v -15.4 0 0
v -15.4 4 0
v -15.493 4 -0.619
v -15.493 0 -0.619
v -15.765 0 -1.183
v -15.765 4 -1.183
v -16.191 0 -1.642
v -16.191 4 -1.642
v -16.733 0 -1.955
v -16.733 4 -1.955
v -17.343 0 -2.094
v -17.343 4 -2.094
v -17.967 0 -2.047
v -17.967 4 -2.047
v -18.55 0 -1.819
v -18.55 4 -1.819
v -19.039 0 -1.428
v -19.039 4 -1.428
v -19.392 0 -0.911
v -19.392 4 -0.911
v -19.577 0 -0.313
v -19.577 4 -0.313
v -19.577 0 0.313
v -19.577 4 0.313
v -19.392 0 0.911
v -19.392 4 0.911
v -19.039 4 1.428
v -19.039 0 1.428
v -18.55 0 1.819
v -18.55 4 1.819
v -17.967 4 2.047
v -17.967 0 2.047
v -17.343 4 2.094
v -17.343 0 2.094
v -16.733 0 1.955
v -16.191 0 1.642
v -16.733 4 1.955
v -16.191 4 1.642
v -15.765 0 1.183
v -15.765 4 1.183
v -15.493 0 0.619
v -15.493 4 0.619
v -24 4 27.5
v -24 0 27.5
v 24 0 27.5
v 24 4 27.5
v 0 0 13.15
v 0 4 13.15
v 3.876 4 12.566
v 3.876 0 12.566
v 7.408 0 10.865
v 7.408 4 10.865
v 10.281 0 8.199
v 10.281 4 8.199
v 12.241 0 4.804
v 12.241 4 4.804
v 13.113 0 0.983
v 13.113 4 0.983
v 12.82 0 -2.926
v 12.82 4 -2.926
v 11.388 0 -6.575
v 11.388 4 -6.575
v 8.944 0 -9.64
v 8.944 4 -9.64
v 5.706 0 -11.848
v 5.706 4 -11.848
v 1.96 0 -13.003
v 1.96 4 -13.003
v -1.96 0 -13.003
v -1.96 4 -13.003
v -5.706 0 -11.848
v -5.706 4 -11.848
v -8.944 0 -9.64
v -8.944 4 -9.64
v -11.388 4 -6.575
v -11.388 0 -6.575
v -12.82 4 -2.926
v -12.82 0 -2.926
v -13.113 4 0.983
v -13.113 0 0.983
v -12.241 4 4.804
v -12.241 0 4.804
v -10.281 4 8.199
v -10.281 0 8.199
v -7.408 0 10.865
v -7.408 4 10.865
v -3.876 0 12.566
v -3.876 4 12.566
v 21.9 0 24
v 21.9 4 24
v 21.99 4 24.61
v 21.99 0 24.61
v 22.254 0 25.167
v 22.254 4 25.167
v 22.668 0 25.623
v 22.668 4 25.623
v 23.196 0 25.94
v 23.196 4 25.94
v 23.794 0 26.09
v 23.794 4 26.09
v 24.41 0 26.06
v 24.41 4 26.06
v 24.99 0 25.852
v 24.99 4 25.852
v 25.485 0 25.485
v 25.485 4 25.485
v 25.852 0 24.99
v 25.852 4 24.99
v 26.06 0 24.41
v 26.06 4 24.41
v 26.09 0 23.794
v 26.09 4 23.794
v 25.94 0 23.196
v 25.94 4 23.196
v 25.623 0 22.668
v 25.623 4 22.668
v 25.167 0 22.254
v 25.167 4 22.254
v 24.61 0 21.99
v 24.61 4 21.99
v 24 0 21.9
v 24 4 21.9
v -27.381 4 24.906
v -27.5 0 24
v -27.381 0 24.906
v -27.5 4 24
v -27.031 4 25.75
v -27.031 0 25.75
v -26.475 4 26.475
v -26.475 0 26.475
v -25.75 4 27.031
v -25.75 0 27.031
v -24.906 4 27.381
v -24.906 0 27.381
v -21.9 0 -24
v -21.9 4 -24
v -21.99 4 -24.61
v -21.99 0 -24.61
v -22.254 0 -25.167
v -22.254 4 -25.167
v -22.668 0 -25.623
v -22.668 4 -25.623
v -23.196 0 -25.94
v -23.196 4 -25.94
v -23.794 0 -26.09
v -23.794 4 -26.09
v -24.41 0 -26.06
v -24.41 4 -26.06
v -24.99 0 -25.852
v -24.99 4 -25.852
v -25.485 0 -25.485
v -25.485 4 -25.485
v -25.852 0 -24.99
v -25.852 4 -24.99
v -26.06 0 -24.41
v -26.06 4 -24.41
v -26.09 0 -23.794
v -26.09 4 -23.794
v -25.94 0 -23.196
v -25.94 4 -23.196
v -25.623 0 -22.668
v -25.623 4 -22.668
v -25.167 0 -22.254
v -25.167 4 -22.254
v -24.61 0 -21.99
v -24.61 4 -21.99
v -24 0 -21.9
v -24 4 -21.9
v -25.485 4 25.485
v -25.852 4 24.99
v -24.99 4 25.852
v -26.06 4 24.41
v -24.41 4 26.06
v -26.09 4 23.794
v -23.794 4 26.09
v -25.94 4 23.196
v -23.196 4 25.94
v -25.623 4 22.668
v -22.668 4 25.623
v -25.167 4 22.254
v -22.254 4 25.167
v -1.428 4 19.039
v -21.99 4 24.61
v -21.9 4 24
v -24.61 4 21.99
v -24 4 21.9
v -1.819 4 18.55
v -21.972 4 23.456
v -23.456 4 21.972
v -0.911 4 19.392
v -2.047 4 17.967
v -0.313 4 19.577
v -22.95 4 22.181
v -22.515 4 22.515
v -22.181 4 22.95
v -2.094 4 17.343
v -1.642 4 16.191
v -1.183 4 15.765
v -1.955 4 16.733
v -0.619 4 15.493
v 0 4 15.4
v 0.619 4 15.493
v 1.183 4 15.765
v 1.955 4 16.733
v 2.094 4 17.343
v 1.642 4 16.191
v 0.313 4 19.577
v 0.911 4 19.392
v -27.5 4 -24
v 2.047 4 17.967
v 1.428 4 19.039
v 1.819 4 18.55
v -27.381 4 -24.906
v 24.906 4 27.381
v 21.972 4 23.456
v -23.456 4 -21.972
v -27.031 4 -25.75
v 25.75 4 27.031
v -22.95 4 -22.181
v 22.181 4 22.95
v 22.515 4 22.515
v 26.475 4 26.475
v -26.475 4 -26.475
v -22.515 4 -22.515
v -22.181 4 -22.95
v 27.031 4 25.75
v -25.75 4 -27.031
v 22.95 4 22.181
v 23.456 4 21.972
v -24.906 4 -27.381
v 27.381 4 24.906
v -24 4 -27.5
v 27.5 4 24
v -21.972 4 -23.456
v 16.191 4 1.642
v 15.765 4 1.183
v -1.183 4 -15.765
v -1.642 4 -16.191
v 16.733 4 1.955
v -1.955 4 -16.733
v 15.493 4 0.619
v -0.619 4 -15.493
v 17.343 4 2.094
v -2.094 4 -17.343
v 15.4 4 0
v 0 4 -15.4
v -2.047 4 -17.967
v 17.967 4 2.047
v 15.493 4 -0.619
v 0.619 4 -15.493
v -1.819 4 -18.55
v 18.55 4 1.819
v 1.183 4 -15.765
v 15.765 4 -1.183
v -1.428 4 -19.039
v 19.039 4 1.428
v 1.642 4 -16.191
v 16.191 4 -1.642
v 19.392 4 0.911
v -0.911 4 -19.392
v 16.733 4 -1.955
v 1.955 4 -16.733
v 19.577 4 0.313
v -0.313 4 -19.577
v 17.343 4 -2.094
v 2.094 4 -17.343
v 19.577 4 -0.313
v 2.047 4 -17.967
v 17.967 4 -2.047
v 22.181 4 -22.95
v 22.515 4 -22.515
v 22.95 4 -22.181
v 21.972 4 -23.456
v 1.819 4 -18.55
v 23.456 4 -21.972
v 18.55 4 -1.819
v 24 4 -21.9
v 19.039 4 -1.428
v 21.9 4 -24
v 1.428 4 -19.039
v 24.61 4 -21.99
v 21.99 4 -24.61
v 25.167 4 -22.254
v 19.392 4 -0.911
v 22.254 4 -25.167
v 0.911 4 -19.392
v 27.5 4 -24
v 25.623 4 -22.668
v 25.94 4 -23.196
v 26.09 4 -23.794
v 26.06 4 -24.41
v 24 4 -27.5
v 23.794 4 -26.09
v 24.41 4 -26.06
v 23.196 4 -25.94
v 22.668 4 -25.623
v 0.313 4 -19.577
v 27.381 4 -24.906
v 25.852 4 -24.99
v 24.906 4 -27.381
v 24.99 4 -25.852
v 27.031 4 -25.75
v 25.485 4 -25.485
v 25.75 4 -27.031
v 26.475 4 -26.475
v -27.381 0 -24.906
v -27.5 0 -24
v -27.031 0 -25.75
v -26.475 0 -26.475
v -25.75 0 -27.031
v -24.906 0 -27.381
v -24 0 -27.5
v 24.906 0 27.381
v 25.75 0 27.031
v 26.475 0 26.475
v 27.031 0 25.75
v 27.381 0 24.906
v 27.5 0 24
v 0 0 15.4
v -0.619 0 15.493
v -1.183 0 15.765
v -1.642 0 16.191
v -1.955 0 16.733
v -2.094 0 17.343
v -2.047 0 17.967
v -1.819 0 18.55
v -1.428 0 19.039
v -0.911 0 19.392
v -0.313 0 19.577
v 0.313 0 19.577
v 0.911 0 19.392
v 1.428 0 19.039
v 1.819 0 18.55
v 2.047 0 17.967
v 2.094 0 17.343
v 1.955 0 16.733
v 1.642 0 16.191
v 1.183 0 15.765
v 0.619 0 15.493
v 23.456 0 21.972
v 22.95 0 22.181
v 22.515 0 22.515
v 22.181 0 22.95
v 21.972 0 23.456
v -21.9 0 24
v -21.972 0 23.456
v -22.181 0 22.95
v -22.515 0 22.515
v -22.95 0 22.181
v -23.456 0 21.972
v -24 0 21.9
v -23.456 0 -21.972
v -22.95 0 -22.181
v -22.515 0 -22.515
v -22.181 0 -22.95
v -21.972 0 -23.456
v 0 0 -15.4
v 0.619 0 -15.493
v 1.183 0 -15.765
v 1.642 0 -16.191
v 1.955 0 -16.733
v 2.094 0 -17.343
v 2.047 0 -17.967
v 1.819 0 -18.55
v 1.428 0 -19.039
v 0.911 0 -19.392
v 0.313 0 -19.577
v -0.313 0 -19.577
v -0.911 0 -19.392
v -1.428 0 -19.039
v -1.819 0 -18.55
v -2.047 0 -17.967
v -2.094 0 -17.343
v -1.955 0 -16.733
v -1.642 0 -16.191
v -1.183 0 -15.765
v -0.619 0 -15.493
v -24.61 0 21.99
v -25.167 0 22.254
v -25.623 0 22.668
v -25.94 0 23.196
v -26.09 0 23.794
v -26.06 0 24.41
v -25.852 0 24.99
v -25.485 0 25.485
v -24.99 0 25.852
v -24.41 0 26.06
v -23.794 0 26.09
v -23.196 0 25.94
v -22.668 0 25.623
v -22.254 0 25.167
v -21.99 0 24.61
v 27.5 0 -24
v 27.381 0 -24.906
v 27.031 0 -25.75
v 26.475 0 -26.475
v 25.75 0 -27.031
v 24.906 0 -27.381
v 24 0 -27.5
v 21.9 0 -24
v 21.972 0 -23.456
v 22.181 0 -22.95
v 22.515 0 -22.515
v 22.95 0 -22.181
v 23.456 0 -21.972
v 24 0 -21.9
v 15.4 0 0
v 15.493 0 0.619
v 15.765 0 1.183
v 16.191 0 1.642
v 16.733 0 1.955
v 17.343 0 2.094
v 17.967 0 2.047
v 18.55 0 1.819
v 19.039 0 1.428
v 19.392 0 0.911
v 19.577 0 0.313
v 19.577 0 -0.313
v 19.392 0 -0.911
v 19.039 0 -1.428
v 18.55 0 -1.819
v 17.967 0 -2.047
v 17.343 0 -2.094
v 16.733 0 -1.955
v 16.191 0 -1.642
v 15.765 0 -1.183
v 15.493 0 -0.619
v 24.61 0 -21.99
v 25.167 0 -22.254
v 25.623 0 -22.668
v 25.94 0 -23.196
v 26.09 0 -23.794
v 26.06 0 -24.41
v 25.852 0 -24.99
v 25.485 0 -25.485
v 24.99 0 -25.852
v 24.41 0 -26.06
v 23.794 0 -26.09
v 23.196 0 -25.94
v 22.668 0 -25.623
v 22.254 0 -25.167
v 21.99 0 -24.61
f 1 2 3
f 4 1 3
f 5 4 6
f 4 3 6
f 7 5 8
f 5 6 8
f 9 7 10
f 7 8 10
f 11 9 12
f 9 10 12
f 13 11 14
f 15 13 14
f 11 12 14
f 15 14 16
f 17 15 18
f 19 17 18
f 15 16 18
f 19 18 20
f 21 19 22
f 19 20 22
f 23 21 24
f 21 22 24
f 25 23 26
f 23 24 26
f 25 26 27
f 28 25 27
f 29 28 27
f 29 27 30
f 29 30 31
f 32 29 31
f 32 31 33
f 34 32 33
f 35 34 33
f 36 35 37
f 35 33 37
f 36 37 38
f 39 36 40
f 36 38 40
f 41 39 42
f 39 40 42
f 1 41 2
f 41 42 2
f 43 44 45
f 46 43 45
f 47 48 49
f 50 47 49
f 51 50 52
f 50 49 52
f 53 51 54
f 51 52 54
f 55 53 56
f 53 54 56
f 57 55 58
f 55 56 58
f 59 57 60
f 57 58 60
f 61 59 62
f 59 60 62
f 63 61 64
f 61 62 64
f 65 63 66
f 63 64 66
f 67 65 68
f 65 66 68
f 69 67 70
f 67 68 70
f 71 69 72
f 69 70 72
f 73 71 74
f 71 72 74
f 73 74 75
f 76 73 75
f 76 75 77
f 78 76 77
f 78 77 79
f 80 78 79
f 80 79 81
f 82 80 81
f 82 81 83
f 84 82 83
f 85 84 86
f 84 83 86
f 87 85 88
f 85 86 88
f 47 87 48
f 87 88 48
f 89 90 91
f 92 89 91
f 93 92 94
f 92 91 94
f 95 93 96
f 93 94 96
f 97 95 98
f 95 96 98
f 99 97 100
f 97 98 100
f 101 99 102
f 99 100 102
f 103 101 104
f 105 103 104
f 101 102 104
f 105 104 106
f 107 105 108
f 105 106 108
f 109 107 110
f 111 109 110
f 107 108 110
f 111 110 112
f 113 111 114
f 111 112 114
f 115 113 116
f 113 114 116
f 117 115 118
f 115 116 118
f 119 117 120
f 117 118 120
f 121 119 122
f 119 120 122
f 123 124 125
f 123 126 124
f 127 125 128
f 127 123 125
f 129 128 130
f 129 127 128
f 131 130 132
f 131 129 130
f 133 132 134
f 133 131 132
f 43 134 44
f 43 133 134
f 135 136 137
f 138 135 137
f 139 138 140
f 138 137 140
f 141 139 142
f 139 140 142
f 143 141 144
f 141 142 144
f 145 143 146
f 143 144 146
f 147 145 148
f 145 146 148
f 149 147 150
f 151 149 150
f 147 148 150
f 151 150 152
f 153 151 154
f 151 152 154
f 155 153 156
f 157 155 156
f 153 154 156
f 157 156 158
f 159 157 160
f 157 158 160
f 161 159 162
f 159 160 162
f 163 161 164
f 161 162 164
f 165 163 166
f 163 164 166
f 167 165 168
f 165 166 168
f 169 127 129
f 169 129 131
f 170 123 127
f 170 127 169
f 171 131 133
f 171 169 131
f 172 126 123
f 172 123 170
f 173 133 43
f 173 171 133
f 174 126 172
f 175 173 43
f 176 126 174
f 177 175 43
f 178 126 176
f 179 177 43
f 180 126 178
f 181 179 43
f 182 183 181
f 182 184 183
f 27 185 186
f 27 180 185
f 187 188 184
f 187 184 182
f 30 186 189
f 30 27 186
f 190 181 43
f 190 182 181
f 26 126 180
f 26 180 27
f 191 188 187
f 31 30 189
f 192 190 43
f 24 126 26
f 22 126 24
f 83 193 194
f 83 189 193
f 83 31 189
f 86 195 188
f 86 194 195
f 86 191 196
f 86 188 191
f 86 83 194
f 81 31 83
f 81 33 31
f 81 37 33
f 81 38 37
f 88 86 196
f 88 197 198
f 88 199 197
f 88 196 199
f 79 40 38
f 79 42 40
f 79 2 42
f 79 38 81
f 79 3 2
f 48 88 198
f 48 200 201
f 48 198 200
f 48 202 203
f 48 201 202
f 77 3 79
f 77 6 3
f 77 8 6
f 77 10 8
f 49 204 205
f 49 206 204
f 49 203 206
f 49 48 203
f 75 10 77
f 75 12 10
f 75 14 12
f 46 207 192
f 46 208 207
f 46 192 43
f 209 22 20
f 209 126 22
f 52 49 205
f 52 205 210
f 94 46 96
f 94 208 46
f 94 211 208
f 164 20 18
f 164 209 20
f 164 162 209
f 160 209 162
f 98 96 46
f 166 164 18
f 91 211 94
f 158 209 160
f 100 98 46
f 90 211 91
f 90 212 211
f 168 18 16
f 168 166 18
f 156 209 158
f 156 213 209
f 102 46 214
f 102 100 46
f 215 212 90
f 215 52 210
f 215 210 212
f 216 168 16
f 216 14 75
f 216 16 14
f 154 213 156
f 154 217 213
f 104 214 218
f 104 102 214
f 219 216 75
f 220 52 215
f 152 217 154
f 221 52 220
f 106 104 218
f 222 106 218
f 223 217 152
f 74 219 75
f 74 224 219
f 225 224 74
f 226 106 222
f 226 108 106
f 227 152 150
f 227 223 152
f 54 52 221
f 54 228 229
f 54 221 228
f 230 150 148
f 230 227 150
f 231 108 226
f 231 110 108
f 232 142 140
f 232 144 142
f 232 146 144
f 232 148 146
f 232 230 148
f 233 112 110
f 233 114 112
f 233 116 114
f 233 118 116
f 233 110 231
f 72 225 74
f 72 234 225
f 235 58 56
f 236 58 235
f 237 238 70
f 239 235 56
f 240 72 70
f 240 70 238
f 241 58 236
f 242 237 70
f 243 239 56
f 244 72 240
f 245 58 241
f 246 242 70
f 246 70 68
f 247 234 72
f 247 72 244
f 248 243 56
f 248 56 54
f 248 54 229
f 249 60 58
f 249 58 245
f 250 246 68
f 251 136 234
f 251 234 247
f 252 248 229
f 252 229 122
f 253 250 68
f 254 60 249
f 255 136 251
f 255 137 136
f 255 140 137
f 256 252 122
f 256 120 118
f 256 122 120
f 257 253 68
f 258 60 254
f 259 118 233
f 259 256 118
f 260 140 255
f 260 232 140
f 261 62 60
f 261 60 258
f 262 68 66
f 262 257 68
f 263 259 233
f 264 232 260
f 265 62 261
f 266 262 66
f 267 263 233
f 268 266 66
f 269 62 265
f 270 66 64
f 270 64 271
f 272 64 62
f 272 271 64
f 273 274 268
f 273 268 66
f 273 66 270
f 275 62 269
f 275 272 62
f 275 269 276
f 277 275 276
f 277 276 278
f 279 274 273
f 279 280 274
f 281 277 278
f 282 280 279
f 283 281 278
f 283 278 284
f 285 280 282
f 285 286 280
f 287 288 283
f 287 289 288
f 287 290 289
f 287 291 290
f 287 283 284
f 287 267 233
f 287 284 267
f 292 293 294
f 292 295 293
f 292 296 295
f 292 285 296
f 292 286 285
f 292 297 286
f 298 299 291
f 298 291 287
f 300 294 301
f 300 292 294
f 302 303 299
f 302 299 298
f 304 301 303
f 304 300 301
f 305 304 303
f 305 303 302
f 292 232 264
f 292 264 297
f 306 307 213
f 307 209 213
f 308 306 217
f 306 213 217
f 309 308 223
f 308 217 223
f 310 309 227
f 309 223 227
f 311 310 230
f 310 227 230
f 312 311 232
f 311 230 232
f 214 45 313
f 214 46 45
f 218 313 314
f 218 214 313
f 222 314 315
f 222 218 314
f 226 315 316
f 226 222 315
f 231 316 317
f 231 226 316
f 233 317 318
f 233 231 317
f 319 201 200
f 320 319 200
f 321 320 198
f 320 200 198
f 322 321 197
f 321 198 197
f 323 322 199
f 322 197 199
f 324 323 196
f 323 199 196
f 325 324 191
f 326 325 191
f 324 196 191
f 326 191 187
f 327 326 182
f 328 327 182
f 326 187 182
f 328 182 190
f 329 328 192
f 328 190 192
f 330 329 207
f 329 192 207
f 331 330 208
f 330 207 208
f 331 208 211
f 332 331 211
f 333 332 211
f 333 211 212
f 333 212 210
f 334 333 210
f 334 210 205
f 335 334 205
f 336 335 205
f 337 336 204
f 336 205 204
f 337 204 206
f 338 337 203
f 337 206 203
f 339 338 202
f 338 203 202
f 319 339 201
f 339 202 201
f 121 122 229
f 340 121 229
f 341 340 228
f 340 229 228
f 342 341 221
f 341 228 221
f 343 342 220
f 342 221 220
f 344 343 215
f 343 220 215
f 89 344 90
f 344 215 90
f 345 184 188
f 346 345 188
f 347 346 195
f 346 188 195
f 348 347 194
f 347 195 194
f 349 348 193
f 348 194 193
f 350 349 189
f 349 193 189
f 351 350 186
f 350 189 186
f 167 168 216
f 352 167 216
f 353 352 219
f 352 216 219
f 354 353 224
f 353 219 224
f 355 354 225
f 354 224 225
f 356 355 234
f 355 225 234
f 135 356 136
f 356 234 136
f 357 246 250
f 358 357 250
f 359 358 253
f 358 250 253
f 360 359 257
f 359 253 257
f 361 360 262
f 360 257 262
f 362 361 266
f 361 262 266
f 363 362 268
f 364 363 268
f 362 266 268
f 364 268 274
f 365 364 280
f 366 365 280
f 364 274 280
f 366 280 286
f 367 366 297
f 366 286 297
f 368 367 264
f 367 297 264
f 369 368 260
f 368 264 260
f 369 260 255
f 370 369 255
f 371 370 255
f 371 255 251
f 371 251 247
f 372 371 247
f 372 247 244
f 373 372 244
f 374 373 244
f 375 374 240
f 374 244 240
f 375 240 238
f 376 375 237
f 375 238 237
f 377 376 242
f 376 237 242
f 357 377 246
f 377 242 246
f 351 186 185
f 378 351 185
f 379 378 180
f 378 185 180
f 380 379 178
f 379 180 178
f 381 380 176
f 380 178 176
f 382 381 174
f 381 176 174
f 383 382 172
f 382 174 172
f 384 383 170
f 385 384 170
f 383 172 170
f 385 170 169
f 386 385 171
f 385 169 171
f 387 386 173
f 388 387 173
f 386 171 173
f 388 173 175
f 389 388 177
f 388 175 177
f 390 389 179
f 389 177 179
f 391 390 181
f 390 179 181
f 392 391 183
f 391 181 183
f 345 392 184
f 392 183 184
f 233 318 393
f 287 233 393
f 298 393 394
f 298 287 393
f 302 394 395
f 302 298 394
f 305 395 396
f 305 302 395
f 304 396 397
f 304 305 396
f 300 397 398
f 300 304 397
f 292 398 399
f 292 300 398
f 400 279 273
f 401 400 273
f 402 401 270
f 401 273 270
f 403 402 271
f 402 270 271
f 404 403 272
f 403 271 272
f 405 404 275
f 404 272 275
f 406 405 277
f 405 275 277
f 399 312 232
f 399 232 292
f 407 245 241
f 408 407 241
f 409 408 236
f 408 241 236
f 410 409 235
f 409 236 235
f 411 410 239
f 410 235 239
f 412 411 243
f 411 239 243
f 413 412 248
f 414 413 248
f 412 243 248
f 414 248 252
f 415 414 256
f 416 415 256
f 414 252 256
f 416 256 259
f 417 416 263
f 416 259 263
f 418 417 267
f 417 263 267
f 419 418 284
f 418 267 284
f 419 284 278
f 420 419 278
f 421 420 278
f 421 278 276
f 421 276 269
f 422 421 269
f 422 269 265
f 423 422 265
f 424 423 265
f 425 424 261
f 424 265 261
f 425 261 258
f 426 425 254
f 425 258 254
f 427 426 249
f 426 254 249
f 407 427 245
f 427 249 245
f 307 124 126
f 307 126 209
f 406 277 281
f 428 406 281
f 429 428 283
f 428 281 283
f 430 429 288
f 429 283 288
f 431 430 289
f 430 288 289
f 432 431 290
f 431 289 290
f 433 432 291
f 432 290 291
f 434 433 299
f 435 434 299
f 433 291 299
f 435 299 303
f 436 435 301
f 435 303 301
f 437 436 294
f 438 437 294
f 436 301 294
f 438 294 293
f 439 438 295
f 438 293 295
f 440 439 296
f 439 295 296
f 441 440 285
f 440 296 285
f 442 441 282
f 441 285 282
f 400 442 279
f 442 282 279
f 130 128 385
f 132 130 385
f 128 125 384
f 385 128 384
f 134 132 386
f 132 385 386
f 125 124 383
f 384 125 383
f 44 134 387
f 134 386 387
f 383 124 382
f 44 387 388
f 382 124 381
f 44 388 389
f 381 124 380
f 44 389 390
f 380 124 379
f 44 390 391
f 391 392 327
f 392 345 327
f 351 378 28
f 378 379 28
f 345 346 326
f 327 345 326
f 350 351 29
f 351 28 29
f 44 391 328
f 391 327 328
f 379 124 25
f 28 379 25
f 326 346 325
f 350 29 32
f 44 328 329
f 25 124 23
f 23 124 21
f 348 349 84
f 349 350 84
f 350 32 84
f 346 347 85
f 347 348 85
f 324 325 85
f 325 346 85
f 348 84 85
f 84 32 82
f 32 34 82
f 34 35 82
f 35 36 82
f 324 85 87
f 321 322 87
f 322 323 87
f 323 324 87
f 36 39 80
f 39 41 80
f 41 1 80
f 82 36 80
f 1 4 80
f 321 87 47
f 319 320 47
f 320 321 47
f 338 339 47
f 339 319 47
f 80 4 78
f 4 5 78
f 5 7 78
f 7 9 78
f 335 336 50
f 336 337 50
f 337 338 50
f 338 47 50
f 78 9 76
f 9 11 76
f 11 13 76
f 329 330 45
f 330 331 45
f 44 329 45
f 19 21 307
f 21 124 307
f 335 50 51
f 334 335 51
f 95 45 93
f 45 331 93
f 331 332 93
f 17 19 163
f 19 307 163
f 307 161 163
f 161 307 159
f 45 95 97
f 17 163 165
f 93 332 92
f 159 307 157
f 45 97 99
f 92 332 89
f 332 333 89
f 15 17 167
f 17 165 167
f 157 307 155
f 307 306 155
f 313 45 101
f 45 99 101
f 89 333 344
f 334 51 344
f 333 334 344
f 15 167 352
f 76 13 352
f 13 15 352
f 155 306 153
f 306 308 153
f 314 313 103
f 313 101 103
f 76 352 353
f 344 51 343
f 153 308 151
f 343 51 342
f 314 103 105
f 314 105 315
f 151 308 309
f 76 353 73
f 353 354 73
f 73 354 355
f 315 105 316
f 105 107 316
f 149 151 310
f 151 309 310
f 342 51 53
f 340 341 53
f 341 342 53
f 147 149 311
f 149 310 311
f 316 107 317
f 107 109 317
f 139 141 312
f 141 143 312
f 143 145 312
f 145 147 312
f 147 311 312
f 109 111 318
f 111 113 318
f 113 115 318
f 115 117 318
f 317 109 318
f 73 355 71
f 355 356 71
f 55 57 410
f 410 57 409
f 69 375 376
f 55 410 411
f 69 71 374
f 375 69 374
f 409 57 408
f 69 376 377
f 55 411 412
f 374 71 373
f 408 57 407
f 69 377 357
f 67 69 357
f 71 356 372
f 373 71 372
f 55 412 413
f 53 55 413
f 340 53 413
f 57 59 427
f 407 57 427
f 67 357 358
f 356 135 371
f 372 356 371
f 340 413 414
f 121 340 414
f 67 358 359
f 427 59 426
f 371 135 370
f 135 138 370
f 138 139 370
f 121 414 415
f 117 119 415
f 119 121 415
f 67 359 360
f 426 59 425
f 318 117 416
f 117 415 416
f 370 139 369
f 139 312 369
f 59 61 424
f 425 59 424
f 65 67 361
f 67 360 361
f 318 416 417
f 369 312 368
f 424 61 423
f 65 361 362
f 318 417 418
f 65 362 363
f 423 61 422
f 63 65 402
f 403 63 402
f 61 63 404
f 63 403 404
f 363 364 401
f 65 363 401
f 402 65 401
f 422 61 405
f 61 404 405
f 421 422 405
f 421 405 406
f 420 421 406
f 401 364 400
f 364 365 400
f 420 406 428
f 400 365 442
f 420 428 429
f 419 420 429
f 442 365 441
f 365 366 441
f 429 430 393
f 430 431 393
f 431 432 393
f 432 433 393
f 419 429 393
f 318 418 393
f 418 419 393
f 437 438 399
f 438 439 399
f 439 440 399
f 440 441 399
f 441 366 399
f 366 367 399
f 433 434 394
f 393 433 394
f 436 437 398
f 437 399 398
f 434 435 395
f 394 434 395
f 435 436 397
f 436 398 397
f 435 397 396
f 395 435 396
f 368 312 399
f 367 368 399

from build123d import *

# Parameters (mm, degrees)
SKETCH_1_W               = 55
SKETCH_1_H               = 55
EXTRUDE_1_DEPTH          = 4
FILLET_1_R               = 3.5
SKETCH_2_R               = 13.15
CUT_EXTRUDE_1_DEPTH      = 4
SKETCH_3_R               = 2.1
CUT_EXTRUDE_2_DEPTH      = 4
PATTERN_CIRCULAR_1_COUNT = 4
CUT_EXTRUDE_3_DEPTH      = 4
PATTERN_CIRCULAR_2_COUNT = 4


with BuildPart() as part:
    # 草图1 → 凸台-拉伸1 (new body)
    with BuildSketch(Plane(origin=(0, 0, 0), x_dir=(1, 0, 0), z_dir=(0, 1, 0))):
        Rectangle(SKETCH_1_W, SKETCH_1_H)
    extrude(amount=EXTRUDE_1_DEPTH)

    # 圆角1
    fillet_1_edges = [part.edges().sort_by_distance(p)[0] for p in [
        (27.5, 2, 27.5),
        (-27.5, 2, 27.5),
        (-27.5, 2, -27.5),
        (27.5, 2, -27.5),
    ]]
    fillet(fillet_1_edges, radius=FILLET_1_R)

    # 草图2 → 切除-拉伸1 (cut)
    with BuildSketch(Plane(origin=(0, 4, 0), x_dir=(1, 0, 0), z_dir=(0, 1, 0))):
        with Locations(Location((0, 0, 0), (0, 0, 270))):
            Circle(SKETCH_2_R)
    extrude(amount=-CUT_EXTRUDE_1_DEPTH, mode=Mode.SUBTRACT)

    # 草图3 → 切除-拉伸2 (cut)
    with BuildSketch(Plane(origin=(0, 4, 0), x_dir=(1, 0, 0), z_dir=(0, 1, 0))):
        with Locations(Location((0, 17.5, 0), (0, 0, 270))):
            Circle(SKETCH_3_R)
    cut_extrude_2 = extrude(amount=-CUT_EXTRUDE_2_DEPTH, mode=Mode.SUBTRACT)

    # 阵列(圆周)1: 切除-拉伸2 ×4 about axis
    pattern_circular_1_axis = Axis((0, 0, 0), (0, 1, 0))
    for i in range(1, PATTERN_CIRCULAR_1_COUNT):
        add(cut_extrude_2.rotate(pattern_circular_1_axis, i * 360 / PATTERN_CIRCULAR_1_COUNT), mode=Mode.SUBTRACT)

    # 草图4 → 切除-拉伸3 (cut)
    with BuildSketch(Plane(origin=(0, 4, 0), x_dir=(1, 0, 0), z_dir=(0, 1, 0))):
        with BuildLine():
            ThreePointArc((-21.9, 24), (-25.48492424, 25.48492424), (-24, 21.9))
            Line((-24, 21.9), (-24, 24))
            Line((-24, 24), (-21.9, 24))
        make_face()
        with BuildLine():
            Line((-24, 24), (-24, 21.9))
            ThreePointArc((-24, 21.9), (-22.51507576, 22.51507576), (-21.9, 24))
            Line((-21.9, 24), (-24, 24))
        make_face()
    cut_extrude_3 = extrude(amount=-CUT_EXTRUDE_3_DEPTH, mode=Mode.SUBTRACT)

    # 阵列(圆周)2: 切除-拉伸3 ×4 about axis
    pattern_circular_2_axis = Axis((0, 0, 0), (0, 1, 0))
    for i in range(1, PATTERN_CIRCULAR_2_COUNT):
        add(cut_extrude_3.rotate(pattern_circular_2_axis, i * 360 / PATTERN_CIRCULAR_2_COUNT), mode=Mode.SUBTRACT)


solid = part.part
